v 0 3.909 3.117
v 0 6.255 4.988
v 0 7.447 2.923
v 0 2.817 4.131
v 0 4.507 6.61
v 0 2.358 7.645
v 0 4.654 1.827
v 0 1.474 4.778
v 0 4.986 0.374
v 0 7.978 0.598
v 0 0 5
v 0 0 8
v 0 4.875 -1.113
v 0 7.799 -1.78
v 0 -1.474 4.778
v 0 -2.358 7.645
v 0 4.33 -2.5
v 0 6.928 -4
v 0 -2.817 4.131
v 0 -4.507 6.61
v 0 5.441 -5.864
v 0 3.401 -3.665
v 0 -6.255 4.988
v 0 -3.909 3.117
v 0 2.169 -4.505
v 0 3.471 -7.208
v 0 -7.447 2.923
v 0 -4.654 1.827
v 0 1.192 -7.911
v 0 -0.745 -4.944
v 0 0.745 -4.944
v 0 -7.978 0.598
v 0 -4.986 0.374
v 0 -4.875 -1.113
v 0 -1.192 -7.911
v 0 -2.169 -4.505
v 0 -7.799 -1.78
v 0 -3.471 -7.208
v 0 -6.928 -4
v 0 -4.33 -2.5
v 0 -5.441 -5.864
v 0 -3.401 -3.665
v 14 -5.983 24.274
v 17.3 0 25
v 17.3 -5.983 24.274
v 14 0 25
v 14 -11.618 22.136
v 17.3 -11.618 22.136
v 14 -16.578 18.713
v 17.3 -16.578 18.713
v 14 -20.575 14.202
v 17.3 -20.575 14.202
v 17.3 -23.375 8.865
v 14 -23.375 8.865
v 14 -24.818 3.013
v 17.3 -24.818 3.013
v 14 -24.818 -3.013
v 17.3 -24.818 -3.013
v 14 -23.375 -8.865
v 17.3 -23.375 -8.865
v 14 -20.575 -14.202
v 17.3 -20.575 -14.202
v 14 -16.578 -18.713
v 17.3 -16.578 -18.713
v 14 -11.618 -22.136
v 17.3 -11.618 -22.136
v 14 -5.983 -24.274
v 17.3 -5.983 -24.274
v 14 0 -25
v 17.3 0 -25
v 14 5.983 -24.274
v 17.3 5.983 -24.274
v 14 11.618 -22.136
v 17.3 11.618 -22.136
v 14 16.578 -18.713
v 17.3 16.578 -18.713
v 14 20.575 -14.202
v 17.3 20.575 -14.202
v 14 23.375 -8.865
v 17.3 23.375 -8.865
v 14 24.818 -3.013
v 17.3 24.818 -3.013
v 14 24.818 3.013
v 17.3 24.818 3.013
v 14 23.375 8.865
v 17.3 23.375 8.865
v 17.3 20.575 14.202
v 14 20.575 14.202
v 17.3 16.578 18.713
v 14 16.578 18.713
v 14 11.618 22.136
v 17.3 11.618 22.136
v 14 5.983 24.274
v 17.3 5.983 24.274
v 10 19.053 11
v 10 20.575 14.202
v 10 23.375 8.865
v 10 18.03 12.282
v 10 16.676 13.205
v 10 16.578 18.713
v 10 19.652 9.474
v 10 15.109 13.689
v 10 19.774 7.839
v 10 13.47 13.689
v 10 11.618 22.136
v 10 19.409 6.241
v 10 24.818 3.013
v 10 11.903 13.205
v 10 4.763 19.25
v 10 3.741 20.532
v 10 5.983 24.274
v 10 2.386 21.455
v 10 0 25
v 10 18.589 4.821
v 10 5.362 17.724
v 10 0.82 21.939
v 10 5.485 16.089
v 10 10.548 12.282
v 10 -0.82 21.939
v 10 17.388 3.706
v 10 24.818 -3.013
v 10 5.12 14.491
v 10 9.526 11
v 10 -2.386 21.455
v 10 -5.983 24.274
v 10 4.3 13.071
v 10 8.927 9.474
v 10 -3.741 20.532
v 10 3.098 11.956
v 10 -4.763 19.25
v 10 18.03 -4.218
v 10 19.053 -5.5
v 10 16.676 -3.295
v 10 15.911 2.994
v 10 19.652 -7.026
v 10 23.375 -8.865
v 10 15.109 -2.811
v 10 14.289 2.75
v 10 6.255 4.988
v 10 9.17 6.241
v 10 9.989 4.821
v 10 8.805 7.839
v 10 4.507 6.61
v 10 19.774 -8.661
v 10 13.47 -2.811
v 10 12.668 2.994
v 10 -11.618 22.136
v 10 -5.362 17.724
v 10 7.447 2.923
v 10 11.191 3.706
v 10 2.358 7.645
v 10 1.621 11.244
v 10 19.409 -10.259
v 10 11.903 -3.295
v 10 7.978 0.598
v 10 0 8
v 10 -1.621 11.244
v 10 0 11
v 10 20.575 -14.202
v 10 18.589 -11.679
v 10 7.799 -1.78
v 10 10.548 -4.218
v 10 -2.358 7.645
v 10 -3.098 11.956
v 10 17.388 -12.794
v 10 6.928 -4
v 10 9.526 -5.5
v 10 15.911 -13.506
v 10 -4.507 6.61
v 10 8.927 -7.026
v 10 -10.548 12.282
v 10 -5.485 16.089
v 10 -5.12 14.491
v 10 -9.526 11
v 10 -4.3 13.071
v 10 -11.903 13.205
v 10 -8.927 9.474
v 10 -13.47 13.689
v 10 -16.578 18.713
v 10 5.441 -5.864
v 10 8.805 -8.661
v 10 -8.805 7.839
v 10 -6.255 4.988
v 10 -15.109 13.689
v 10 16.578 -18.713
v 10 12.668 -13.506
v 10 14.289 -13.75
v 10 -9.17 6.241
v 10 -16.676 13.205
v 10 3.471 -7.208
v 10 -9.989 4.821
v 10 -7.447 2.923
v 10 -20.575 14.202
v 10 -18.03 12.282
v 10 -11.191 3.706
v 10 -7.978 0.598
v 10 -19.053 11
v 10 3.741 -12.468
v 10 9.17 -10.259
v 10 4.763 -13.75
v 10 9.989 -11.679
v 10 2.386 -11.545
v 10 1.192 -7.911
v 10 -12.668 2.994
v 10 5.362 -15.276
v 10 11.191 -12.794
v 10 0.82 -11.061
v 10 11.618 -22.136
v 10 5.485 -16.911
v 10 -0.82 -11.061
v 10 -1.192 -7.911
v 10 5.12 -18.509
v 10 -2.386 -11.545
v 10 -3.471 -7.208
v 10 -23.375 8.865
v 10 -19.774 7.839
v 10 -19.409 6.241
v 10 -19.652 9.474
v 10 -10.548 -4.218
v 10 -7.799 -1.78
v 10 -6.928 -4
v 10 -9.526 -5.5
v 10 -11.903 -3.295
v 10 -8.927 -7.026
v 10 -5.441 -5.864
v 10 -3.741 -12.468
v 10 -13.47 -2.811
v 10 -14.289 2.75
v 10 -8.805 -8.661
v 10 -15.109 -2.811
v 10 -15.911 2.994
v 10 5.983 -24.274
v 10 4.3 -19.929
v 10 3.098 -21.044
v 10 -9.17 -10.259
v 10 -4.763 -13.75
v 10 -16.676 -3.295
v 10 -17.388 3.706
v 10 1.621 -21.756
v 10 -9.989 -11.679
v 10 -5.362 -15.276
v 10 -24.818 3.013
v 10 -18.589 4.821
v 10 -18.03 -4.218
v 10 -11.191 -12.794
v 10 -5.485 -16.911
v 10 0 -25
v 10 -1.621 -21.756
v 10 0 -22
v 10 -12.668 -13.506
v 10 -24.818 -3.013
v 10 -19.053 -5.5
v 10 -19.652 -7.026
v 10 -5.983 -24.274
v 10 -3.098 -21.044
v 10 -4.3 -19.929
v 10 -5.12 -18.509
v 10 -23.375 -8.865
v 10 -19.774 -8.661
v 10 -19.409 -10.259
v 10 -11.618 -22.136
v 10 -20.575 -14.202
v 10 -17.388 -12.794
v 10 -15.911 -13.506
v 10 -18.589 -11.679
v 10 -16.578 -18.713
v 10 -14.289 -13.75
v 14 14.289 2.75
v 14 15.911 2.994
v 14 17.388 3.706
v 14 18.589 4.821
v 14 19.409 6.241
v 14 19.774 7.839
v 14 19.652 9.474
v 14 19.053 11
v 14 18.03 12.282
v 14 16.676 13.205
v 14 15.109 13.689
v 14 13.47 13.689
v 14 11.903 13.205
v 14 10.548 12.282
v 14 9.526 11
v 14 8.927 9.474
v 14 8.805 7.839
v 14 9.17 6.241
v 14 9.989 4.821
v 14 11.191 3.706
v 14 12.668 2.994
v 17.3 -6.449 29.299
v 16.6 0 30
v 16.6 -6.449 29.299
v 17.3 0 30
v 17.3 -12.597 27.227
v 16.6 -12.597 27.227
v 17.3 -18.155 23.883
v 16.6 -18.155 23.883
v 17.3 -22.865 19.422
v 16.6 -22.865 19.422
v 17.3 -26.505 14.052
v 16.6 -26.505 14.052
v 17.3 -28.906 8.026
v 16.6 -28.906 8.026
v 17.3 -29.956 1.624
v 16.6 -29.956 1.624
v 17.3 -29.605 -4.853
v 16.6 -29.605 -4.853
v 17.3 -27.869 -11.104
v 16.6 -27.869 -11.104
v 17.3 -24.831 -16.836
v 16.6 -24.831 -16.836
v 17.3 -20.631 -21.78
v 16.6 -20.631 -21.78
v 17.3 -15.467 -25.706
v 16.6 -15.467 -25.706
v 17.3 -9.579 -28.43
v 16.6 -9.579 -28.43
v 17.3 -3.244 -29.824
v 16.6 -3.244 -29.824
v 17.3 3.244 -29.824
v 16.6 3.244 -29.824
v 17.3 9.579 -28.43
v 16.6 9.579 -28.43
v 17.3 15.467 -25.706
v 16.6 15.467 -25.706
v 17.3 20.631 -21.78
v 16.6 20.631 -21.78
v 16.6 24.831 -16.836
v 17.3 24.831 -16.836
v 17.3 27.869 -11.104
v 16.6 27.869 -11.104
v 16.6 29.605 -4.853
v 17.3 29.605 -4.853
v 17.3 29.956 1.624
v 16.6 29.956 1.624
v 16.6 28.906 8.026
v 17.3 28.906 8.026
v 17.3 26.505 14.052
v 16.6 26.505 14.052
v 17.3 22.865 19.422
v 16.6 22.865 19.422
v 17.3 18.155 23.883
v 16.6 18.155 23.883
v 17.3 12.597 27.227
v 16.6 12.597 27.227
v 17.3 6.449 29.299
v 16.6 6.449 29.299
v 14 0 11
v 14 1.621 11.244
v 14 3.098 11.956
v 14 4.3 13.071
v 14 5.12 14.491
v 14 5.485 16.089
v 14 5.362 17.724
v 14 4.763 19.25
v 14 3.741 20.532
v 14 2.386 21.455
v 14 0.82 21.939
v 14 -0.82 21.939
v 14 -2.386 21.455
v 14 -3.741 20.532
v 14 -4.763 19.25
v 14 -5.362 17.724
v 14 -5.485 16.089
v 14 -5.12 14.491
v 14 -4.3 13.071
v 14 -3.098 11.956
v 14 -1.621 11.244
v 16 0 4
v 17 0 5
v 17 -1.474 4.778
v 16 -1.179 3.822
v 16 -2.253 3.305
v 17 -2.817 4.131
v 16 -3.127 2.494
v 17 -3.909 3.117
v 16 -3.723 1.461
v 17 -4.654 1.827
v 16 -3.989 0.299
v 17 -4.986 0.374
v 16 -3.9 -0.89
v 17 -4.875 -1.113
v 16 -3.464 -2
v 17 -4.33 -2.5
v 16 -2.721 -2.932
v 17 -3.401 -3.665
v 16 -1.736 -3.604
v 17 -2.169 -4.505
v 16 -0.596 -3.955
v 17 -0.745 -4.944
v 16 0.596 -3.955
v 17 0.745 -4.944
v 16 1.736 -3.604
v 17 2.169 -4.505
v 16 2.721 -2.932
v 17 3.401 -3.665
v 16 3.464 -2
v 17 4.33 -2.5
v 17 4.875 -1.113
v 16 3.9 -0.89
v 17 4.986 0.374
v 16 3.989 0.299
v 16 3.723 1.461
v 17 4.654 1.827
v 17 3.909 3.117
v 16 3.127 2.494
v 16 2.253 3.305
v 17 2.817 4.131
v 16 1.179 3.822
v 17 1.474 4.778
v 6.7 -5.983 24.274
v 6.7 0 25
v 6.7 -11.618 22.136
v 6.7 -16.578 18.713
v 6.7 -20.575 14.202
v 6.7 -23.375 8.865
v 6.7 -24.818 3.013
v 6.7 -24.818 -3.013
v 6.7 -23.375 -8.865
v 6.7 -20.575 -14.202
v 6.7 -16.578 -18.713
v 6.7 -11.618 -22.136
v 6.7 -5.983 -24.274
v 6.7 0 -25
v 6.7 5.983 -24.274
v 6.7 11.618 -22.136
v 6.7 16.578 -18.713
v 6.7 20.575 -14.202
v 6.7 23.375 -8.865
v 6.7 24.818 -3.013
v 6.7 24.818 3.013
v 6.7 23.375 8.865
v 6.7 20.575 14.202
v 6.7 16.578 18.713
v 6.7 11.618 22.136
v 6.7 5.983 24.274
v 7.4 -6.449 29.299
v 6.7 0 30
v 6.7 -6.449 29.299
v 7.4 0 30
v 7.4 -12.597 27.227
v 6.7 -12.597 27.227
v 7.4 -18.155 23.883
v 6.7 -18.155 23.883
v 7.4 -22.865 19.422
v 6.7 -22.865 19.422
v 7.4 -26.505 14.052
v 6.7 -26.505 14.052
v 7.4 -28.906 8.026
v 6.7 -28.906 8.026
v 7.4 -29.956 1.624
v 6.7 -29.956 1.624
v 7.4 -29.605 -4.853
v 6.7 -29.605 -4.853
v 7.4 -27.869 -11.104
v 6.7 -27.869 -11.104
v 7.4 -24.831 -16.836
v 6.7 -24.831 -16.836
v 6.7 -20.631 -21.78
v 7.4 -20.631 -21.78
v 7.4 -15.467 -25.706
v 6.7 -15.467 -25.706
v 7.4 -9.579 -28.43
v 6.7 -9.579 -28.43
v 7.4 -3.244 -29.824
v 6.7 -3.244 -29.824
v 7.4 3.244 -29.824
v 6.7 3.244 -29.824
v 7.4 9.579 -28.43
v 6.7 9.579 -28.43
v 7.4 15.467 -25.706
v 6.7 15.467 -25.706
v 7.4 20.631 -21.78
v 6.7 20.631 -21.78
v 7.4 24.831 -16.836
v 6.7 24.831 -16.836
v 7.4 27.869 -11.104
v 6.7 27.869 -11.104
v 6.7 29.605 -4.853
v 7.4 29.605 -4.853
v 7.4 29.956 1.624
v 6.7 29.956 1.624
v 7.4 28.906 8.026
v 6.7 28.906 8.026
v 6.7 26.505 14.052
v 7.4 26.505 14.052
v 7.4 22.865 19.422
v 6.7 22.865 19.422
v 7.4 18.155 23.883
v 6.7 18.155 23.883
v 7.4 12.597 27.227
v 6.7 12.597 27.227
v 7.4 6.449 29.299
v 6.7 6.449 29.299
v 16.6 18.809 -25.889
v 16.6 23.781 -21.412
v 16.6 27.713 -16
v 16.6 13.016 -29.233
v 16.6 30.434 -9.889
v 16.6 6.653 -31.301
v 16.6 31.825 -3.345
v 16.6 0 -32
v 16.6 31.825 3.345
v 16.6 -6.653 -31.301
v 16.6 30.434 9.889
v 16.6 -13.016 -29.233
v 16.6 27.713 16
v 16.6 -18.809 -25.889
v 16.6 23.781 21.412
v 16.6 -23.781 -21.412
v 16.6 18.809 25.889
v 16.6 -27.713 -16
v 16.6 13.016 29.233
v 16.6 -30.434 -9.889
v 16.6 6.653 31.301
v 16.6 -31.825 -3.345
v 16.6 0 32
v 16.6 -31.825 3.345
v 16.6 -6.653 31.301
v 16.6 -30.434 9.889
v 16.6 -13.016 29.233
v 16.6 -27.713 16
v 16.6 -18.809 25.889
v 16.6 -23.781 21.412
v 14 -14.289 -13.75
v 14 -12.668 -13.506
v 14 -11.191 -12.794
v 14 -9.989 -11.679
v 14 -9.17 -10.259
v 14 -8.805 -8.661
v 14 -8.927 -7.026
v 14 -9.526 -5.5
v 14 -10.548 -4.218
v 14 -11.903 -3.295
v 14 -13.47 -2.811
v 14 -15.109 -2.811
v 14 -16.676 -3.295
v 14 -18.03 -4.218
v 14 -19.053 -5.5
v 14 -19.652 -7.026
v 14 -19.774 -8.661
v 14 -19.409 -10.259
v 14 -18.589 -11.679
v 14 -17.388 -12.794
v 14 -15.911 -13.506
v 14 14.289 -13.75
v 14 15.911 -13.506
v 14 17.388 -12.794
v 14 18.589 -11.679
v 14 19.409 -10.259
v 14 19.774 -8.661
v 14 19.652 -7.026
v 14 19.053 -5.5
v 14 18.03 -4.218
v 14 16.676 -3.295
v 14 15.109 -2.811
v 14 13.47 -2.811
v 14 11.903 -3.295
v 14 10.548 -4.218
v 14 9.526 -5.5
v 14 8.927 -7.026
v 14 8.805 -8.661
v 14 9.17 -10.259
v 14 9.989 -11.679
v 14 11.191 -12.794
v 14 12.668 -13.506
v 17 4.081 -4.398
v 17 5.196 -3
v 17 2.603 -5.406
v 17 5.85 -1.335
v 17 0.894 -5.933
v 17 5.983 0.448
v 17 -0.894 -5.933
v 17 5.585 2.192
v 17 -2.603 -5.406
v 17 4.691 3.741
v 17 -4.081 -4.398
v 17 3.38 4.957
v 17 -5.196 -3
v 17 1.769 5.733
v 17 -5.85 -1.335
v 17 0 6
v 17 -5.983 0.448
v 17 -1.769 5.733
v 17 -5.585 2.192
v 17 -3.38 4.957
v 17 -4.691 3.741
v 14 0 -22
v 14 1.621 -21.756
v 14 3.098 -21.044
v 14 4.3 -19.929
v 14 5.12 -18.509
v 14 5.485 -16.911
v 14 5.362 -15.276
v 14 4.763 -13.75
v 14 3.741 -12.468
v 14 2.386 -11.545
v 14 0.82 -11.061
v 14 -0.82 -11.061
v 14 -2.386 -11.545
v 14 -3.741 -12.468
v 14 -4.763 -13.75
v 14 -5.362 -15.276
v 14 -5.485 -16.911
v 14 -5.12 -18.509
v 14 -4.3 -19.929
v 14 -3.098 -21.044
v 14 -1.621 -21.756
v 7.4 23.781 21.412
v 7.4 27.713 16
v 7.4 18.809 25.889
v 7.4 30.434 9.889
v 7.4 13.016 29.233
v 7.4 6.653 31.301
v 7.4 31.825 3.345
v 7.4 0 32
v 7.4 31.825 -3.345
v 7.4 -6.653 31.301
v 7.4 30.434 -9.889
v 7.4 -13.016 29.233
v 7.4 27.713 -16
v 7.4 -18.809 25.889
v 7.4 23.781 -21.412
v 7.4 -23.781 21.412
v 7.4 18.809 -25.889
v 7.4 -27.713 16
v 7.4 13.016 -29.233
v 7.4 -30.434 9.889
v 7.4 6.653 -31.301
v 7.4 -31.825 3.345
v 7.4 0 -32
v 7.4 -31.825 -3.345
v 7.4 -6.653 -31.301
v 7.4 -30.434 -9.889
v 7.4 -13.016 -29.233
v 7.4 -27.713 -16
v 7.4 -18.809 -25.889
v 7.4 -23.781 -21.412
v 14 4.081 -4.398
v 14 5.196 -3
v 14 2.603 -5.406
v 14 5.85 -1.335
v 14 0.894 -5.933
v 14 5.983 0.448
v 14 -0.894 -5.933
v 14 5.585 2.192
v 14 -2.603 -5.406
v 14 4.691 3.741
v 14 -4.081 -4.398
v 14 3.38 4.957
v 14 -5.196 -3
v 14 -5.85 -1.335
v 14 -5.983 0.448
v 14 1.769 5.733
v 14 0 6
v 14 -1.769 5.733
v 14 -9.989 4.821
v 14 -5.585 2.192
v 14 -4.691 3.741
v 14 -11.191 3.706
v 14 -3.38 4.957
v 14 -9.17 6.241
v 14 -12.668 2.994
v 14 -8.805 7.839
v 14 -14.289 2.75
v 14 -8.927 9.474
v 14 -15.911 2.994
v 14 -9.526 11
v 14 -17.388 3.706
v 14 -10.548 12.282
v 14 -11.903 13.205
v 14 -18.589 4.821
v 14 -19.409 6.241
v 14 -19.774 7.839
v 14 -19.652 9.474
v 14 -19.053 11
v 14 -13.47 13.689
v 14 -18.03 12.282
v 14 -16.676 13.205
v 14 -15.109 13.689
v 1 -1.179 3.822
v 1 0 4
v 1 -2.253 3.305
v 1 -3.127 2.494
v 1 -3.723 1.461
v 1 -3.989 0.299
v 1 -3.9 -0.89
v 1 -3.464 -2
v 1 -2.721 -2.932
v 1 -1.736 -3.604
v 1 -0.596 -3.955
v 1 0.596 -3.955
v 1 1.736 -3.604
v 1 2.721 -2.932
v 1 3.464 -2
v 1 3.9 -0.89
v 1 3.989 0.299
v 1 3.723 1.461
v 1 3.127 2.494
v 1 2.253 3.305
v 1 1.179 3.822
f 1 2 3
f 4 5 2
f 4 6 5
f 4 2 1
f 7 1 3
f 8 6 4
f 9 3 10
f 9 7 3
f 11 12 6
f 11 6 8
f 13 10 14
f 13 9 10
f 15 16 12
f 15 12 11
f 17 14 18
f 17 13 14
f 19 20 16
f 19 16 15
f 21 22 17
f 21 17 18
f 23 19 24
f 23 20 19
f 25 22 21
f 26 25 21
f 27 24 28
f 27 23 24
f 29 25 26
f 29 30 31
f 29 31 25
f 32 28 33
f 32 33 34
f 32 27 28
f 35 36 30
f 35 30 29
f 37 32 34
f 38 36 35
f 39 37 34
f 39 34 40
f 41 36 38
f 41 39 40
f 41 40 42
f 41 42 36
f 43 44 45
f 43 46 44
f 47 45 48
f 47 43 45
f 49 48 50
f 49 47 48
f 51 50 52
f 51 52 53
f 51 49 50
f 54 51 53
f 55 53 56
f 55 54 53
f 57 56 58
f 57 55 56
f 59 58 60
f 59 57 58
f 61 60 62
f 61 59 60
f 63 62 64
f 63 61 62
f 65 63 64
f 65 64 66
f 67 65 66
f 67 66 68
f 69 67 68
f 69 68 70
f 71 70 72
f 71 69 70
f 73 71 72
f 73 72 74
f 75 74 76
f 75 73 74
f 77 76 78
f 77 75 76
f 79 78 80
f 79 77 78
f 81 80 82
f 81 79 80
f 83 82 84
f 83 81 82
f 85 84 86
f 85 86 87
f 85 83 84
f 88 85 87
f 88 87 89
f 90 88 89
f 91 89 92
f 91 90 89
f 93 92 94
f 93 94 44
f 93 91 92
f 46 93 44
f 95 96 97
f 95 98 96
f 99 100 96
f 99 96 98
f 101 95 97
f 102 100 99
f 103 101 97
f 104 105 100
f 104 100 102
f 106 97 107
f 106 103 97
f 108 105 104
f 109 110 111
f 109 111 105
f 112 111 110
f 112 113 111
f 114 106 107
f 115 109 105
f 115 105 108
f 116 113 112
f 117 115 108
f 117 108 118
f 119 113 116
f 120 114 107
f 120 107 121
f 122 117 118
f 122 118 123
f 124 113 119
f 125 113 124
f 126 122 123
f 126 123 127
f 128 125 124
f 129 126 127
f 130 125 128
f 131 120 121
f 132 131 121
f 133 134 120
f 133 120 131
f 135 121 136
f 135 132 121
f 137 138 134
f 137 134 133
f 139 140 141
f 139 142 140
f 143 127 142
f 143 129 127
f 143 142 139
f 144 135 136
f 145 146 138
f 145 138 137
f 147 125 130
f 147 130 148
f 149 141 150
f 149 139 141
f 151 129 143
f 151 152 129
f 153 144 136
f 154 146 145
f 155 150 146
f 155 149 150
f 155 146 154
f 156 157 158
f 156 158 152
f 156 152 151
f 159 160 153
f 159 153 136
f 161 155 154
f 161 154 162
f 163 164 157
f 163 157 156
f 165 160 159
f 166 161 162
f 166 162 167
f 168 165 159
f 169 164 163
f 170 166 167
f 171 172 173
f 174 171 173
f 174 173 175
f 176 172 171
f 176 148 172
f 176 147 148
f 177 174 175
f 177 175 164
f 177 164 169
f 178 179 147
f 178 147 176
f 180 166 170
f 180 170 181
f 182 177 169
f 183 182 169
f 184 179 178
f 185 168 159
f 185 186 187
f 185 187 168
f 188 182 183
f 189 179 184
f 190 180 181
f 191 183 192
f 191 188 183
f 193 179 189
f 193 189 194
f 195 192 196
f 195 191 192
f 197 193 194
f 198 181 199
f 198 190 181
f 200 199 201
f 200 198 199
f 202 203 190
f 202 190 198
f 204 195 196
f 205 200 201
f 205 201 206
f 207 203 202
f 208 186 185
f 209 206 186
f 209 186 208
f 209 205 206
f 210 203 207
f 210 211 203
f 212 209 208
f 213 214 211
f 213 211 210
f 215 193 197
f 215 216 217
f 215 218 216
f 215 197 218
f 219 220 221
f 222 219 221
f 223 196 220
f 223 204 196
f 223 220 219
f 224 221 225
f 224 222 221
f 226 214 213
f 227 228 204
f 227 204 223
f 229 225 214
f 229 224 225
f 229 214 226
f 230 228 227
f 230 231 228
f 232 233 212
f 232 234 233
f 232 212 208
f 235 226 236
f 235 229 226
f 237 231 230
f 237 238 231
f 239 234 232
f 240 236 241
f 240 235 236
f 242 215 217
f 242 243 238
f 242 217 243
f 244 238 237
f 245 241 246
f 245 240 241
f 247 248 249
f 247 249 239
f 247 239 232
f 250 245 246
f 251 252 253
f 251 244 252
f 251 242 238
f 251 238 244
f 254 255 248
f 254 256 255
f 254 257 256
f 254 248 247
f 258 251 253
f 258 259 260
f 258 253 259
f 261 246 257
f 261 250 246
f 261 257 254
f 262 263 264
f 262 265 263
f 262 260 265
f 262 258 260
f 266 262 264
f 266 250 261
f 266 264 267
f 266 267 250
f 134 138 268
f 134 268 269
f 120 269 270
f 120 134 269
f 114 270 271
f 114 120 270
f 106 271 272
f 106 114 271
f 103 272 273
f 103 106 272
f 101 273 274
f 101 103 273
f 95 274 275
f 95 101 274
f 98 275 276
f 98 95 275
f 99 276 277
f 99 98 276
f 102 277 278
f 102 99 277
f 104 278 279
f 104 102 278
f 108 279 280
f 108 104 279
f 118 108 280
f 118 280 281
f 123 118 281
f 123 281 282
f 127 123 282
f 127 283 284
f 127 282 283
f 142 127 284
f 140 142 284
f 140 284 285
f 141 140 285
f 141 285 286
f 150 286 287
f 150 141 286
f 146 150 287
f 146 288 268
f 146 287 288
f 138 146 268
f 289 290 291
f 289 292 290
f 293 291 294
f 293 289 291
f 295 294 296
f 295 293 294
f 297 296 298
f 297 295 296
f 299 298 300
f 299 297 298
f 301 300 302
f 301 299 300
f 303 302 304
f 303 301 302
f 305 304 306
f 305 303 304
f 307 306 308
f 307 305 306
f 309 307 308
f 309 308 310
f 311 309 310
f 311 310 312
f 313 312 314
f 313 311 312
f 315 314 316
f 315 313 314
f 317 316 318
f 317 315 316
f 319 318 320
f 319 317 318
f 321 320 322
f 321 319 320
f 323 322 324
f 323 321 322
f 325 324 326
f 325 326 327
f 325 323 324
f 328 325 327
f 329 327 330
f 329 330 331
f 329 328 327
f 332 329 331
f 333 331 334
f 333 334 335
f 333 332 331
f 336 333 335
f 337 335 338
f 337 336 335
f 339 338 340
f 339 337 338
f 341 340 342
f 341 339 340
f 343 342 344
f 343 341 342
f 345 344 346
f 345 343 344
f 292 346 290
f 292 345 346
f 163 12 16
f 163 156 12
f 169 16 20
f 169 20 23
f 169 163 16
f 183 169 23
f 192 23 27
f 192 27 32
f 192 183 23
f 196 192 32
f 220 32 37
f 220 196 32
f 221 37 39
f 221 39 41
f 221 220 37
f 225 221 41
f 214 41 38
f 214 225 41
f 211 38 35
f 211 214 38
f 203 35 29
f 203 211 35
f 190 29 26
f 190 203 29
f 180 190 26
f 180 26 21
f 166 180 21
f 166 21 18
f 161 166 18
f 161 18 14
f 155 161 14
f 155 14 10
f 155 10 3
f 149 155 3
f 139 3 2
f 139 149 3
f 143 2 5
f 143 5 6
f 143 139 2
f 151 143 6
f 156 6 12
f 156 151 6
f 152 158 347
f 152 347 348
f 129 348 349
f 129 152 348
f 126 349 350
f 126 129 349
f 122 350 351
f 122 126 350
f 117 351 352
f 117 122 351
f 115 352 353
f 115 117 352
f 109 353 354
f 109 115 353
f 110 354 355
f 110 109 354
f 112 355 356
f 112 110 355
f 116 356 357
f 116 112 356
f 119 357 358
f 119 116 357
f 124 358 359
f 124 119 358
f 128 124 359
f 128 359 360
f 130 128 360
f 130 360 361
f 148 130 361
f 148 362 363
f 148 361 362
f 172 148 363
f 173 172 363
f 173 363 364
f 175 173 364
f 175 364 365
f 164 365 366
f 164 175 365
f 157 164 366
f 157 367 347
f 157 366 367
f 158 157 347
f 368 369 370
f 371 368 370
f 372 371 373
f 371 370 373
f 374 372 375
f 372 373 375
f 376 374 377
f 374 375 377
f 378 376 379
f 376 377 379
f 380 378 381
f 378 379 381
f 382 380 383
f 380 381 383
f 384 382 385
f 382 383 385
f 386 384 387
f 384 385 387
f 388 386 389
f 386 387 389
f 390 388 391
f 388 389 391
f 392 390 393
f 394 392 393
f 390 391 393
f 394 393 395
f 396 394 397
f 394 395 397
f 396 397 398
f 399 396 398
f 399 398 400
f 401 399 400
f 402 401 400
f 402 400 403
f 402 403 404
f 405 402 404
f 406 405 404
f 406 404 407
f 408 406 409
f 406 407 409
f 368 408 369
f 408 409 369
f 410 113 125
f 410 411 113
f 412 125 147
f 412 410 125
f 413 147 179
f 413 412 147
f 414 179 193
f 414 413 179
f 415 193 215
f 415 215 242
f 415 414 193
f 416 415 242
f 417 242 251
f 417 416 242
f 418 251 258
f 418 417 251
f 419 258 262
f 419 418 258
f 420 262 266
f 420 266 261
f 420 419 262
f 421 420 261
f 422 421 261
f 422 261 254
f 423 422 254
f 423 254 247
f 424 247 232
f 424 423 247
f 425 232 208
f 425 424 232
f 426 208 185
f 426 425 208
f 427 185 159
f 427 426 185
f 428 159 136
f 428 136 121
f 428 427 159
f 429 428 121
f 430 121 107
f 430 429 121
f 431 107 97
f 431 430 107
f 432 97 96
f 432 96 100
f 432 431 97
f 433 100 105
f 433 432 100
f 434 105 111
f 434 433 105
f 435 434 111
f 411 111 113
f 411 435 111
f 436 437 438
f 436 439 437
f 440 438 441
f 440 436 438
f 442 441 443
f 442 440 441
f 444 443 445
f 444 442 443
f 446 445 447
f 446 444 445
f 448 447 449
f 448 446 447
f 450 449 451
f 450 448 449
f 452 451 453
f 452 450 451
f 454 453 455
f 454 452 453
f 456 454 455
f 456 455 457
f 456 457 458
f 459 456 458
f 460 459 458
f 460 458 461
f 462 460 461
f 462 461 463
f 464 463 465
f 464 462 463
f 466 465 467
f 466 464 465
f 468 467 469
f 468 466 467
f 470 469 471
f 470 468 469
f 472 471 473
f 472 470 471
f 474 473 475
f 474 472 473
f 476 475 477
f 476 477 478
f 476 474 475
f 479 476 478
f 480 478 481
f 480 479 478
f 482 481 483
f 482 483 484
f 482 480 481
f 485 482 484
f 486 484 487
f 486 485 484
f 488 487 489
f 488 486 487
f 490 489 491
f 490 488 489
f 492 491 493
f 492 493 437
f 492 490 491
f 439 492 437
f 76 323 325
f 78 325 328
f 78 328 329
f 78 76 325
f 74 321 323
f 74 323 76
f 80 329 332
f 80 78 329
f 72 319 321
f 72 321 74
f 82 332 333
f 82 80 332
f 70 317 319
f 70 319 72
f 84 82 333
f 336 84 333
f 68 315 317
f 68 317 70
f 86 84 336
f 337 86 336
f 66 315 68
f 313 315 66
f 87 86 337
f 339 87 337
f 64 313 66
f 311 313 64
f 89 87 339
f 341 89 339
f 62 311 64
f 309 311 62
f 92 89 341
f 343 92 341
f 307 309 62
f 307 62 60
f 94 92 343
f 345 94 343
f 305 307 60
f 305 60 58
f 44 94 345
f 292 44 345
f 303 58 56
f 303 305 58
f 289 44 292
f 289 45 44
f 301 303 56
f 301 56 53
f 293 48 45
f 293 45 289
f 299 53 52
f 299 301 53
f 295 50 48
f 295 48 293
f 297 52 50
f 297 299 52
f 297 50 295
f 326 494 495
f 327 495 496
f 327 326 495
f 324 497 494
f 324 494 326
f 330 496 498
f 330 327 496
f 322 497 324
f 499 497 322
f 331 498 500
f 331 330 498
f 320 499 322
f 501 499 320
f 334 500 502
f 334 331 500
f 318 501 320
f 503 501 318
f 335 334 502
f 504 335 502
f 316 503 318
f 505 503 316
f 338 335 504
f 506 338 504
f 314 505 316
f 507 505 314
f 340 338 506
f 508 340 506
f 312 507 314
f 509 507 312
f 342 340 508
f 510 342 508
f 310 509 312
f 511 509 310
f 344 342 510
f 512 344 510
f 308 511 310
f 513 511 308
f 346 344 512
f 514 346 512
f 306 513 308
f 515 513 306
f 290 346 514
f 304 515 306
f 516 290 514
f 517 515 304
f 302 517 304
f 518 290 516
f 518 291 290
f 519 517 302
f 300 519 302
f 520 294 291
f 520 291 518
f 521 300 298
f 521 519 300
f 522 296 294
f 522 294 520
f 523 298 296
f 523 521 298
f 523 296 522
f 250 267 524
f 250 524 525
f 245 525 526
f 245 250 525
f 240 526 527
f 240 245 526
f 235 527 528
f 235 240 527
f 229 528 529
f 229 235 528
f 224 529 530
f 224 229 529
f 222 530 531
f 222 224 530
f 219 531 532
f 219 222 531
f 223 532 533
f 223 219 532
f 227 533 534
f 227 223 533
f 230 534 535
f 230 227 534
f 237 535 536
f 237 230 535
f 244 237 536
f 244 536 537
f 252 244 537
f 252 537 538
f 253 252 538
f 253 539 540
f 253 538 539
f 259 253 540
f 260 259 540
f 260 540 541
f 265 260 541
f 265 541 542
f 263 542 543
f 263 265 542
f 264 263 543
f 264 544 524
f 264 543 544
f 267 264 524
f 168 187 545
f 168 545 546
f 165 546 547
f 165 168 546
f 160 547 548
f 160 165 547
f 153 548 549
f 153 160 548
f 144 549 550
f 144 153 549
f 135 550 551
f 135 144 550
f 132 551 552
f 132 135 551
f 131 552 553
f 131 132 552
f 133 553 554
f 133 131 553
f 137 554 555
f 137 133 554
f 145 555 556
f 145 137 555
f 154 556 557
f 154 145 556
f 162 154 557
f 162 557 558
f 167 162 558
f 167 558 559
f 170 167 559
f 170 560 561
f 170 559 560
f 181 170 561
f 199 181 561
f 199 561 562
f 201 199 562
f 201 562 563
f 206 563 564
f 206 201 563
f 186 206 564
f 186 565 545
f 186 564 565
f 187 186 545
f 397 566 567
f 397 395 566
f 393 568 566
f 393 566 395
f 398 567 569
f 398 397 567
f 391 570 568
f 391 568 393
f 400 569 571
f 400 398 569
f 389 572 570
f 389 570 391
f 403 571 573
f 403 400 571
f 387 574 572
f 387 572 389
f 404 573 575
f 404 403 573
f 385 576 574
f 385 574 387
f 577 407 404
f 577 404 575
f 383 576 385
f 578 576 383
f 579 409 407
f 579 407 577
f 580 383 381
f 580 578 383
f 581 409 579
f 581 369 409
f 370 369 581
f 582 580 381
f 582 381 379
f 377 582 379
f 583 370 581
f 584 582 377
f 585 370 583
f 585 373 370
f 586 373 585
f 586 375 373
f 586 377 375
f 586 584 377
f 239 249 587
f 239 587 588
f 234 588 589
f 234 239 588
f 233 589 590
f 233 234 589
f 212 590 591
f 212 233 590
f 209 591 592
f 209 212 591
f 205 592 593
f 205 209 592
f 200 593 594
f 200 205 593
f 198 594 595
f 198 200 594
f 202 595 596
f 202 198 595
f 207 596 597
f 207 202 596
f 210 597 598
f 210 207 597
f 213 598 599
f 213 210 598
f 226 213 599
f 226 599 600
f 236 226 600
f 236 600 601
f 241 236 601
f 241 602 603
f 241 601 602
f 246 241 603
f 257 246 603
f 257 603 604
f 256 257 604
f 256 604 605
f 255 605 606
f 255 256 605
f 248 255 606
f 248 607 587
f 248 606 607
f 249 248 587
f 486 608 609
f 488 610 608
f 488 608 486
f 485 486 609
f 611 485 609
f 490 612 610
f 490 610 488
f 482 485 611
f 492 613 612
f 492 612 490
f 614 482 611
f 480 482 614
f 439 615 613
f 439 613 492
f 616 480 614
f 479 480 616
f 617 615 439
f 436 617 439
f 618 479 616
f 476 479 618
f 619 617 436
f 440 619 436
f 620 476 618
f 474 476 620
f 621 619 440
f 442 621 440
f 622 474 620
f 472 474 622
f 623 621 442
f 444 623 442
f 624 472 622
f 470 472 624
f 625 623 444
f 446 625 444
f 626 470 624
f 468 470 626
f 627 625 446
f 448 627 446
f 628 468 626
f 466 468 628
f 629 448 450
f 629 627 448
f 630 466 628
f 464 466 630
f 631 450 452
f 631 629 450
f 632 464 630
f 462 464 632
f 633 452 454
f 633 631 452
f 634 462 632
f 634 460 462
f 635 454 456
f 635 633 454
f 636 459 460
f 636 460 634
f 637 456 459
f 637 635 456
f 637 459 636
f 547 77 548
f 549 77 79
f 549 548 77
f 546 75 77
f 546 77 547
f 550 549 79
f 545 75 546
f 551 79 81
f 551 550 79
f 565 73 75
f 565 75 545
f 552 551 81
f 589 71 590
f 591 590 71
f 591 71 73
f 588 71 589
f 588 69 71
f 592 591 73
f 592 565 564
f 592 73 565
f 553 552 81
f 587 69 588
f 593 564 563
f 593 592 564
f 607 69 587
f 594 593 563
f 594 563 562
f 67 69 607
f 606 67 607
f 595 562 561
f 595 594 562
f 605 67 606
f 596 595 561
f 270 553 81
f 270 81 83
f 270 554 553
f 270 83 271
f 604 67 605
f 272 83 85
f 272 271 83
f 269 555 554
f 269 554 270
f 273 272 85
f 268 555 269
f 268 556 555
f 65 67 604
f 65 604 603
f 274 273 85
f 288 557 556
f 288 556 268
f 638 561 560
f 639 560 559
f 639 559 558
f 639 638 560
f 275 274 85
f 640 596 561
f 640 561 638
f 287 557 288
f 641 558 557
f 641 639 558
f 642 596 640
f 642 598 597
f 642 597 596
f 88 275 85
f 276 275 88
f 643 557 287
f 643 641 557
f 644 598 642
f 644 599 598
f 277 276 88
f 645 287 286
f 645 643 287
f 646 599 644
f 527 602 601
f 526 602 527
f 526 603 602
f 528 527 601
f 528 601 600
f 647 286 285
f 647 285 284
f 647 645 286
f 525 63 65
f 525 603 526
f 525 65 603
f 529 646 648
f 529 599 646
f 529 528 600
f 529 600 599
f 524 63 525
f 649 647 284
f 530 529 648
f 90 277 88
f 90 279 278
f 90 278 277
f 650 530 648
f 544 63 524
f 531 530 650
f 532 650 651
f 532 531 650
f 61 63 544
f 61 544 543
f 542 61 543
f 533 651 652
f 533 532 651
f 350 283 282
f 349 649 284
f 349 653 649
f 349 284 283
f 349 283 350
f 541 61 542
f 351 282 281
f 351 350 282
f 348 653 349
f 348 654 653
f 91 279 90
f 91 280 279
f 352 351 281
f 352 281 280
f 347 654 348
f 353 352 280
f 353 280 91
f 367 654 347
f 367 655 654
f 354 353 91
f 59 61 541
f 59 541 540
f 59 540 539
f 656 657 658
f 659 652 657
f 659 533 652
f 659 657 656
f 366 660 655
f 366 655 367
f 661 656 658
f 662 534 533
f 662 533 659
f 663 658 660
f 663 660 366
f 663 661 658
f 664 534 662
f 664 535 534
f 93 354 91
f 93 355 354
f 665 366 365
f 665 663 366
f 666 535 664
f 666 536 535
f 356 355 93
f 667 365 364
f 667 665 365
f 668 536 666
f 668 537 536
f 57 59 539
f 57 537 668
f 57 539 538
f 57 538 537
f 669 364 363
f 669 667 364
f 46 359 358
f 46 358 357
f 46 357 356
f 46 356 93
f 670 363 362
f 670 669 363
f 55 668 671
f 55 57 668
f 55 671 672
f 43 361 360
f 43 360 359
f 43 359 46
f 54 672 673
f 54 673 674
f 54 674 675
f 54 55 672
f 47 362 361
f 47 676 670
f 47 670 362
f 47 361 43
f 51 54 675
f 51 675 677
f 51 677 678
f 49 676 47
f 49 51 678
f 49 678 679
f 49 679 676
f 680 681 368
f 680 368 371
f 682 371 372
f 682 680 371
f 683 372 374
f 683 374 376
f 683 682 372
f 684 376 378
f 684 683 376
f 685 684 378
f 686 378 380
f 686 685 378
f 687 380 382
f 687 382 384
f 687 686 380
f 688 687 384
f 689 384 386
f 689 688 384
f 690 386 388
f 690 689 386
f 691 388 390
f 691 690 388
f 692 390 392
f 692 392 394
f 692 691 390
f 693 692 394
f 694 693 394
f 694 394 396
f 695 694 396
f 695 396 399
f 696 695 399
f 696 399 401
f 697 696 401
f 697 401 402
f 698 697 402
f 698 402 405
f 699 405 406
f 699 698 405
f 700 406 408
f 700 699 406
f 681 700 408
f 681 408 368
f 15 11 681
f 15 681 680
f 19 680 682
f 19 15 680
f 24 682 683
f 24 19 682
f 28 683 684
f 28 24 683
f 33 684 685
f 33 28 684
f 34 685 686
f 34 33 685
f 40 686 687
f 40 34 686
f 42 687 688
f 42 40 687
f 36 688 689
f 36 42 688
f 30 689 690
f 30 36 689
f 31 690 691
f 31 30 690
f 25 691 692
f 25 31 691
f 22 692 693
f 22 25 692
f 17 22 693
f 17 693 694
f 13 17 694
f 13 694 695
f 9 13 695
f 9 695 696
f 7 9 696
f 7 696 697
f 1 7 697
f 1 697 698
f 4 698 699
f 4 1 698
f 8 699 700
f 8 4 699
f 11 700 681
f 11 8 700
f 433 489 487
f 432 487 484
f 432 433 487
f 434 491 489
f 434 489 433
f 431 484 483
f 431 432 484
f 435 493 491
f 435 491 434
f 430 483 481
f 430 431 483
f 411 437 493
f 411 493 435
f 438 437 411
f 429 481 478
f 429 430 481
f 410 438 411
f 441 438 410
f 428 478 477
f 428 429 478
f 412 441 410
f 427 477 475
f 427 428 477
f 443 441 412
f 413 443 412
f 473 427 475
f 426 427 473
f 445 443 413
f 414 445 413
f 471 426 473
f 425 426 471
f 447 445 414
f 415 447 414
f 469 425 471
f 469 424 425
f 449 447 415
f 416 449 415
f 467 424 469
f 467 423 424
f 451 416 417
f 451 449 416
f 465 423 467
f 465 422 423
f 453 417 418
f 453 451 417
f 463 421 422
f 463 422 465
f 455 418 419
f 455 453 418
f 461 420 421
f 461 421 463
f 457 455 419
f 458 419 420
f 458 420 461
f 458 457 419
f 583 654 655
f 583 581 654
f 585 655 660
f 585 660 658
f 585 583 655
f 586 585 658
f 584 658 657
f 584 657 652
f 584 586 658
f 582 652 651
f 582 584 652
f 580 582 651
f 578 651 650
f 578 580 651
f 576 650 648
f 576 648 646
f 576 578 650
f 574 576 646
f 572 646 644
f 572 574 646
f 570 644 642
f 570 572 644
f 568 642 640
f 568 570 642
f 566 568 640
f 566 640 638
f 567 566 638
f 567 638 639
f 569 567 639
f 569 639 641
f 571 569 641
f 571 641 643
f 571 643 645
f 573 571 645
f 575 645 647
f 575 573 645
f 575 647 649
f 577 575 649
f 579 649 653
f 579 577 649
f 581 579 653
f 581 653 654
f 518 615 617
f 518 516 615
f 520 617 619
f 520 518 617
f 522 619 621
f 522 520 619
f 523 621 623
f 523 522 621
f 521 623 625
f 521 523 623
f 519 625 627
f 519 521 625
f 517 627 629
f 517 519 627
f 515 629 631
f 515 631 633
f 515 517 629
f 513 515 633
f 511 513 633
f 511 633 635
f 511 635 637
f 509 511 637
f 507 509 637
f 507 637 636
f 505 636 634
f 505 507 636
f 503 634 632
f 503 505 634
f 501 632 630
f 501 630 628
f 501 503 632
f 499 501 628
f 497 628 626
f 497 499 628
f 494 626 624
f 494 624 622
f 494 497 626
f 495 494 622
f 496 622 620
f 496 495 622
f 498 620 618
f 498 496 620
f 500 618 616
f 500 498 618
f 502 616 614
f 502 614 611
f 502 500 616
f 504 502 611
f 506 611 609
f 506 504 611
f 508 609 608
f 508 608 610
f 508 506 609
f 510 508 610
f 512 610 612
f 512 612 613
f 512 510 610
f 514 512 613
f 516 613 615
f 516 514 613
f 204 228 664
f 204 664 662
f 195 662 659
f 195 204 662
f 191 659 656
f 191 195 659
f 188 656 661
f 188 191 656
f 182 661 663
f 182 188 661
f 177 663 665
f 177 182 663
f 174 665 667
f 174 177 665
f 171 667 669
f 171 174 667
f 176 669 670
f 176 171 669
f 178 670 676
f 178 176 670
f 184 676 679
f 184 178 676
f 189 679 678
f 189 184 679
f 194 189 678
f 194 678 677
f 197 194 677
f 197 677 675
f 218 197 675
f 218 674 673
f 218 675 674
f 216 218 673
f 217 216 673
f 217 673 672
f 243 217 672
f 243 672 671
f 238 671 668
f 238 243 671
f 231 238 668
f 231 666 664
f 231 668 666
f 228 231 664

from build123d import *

# Parameters (mm, degrees)
CHAMFER1_SIZE           = 1
CUT_EXTRUDE1_DEPTH      = 48.370877129
CUT_EXTRUDE1_DEPTH_BACK = 48.370877129
SKETCH2_R               = 5.5


with BuildPart() as part:
    # Sketch1 → Revolve1 (revolve)
    with BuildSketch(Plane(origin=(0, 0, 0), x_dir=(1, 0, 0), z_dir=(0, 1, 0)), mode=Mode.PRIVATE) as revolve1_sk:
        Polygon((17, 4), (0, 4), (0, 8), (10, 8), (10, 25), (6.7, 25), (6.7, 30), (7.4, 30), (7.4, 32), (16.6, 32), (16.6, 30), (17.3, 30), (17.3, 25), (14, 25), (14, 6), (17, 6), align=None)
    revolve(revolve1_sk.sketch.rotate(Axis((0, 0, 0), (1, 0, 0)), 180), axis=Axis((0, 0, 0), (1, 0, 0)))

    # Chamfer1
    chamfer1_edges = [part.edges().sort_by_distance(p)[0] for p in [
        (0, 0, -4),
        (17, 0, -4),
    ]]
    chamfer(chamfer1_edges, length=CHAMFER1_SIZE)

    # Sketch2 → Cut-Extrude1 (cut, two sides: drawn at the far end of the back side and taken through both)
    with BuildSketch(Plane(origin=(14, 0, 0), x_dir=(0, 0, -1), z_dir=(1, 0, 0)).offset(-CUT_EXTRUDE1_DEPTH_BACK)):
        with Locations((-16.5, 0)):
            Circle(SKETCH2_R)
        with Locations((-8.25, 14.289419162)):
            Circle(SKETCH2_R)
        with Locations((8.25, 14.289419162)):
            Circle(SKETCH2_R)
        with Locations((16.5, 0)):
            Circle(SKETCH2_R)
        with Locations((8.25, -14.289419162)):
            Circle(SKETCH2_R)
        with Locations((-8.25, -14.289419162)):
            Circle(SKETCH2_R)
    extrude(amount=CUT_EXTRUDE1_DEPTH + CUT_EXTRUDE1_DEPTH_BACK, mode=Mode.SUBTRACT)


solid = part.part
